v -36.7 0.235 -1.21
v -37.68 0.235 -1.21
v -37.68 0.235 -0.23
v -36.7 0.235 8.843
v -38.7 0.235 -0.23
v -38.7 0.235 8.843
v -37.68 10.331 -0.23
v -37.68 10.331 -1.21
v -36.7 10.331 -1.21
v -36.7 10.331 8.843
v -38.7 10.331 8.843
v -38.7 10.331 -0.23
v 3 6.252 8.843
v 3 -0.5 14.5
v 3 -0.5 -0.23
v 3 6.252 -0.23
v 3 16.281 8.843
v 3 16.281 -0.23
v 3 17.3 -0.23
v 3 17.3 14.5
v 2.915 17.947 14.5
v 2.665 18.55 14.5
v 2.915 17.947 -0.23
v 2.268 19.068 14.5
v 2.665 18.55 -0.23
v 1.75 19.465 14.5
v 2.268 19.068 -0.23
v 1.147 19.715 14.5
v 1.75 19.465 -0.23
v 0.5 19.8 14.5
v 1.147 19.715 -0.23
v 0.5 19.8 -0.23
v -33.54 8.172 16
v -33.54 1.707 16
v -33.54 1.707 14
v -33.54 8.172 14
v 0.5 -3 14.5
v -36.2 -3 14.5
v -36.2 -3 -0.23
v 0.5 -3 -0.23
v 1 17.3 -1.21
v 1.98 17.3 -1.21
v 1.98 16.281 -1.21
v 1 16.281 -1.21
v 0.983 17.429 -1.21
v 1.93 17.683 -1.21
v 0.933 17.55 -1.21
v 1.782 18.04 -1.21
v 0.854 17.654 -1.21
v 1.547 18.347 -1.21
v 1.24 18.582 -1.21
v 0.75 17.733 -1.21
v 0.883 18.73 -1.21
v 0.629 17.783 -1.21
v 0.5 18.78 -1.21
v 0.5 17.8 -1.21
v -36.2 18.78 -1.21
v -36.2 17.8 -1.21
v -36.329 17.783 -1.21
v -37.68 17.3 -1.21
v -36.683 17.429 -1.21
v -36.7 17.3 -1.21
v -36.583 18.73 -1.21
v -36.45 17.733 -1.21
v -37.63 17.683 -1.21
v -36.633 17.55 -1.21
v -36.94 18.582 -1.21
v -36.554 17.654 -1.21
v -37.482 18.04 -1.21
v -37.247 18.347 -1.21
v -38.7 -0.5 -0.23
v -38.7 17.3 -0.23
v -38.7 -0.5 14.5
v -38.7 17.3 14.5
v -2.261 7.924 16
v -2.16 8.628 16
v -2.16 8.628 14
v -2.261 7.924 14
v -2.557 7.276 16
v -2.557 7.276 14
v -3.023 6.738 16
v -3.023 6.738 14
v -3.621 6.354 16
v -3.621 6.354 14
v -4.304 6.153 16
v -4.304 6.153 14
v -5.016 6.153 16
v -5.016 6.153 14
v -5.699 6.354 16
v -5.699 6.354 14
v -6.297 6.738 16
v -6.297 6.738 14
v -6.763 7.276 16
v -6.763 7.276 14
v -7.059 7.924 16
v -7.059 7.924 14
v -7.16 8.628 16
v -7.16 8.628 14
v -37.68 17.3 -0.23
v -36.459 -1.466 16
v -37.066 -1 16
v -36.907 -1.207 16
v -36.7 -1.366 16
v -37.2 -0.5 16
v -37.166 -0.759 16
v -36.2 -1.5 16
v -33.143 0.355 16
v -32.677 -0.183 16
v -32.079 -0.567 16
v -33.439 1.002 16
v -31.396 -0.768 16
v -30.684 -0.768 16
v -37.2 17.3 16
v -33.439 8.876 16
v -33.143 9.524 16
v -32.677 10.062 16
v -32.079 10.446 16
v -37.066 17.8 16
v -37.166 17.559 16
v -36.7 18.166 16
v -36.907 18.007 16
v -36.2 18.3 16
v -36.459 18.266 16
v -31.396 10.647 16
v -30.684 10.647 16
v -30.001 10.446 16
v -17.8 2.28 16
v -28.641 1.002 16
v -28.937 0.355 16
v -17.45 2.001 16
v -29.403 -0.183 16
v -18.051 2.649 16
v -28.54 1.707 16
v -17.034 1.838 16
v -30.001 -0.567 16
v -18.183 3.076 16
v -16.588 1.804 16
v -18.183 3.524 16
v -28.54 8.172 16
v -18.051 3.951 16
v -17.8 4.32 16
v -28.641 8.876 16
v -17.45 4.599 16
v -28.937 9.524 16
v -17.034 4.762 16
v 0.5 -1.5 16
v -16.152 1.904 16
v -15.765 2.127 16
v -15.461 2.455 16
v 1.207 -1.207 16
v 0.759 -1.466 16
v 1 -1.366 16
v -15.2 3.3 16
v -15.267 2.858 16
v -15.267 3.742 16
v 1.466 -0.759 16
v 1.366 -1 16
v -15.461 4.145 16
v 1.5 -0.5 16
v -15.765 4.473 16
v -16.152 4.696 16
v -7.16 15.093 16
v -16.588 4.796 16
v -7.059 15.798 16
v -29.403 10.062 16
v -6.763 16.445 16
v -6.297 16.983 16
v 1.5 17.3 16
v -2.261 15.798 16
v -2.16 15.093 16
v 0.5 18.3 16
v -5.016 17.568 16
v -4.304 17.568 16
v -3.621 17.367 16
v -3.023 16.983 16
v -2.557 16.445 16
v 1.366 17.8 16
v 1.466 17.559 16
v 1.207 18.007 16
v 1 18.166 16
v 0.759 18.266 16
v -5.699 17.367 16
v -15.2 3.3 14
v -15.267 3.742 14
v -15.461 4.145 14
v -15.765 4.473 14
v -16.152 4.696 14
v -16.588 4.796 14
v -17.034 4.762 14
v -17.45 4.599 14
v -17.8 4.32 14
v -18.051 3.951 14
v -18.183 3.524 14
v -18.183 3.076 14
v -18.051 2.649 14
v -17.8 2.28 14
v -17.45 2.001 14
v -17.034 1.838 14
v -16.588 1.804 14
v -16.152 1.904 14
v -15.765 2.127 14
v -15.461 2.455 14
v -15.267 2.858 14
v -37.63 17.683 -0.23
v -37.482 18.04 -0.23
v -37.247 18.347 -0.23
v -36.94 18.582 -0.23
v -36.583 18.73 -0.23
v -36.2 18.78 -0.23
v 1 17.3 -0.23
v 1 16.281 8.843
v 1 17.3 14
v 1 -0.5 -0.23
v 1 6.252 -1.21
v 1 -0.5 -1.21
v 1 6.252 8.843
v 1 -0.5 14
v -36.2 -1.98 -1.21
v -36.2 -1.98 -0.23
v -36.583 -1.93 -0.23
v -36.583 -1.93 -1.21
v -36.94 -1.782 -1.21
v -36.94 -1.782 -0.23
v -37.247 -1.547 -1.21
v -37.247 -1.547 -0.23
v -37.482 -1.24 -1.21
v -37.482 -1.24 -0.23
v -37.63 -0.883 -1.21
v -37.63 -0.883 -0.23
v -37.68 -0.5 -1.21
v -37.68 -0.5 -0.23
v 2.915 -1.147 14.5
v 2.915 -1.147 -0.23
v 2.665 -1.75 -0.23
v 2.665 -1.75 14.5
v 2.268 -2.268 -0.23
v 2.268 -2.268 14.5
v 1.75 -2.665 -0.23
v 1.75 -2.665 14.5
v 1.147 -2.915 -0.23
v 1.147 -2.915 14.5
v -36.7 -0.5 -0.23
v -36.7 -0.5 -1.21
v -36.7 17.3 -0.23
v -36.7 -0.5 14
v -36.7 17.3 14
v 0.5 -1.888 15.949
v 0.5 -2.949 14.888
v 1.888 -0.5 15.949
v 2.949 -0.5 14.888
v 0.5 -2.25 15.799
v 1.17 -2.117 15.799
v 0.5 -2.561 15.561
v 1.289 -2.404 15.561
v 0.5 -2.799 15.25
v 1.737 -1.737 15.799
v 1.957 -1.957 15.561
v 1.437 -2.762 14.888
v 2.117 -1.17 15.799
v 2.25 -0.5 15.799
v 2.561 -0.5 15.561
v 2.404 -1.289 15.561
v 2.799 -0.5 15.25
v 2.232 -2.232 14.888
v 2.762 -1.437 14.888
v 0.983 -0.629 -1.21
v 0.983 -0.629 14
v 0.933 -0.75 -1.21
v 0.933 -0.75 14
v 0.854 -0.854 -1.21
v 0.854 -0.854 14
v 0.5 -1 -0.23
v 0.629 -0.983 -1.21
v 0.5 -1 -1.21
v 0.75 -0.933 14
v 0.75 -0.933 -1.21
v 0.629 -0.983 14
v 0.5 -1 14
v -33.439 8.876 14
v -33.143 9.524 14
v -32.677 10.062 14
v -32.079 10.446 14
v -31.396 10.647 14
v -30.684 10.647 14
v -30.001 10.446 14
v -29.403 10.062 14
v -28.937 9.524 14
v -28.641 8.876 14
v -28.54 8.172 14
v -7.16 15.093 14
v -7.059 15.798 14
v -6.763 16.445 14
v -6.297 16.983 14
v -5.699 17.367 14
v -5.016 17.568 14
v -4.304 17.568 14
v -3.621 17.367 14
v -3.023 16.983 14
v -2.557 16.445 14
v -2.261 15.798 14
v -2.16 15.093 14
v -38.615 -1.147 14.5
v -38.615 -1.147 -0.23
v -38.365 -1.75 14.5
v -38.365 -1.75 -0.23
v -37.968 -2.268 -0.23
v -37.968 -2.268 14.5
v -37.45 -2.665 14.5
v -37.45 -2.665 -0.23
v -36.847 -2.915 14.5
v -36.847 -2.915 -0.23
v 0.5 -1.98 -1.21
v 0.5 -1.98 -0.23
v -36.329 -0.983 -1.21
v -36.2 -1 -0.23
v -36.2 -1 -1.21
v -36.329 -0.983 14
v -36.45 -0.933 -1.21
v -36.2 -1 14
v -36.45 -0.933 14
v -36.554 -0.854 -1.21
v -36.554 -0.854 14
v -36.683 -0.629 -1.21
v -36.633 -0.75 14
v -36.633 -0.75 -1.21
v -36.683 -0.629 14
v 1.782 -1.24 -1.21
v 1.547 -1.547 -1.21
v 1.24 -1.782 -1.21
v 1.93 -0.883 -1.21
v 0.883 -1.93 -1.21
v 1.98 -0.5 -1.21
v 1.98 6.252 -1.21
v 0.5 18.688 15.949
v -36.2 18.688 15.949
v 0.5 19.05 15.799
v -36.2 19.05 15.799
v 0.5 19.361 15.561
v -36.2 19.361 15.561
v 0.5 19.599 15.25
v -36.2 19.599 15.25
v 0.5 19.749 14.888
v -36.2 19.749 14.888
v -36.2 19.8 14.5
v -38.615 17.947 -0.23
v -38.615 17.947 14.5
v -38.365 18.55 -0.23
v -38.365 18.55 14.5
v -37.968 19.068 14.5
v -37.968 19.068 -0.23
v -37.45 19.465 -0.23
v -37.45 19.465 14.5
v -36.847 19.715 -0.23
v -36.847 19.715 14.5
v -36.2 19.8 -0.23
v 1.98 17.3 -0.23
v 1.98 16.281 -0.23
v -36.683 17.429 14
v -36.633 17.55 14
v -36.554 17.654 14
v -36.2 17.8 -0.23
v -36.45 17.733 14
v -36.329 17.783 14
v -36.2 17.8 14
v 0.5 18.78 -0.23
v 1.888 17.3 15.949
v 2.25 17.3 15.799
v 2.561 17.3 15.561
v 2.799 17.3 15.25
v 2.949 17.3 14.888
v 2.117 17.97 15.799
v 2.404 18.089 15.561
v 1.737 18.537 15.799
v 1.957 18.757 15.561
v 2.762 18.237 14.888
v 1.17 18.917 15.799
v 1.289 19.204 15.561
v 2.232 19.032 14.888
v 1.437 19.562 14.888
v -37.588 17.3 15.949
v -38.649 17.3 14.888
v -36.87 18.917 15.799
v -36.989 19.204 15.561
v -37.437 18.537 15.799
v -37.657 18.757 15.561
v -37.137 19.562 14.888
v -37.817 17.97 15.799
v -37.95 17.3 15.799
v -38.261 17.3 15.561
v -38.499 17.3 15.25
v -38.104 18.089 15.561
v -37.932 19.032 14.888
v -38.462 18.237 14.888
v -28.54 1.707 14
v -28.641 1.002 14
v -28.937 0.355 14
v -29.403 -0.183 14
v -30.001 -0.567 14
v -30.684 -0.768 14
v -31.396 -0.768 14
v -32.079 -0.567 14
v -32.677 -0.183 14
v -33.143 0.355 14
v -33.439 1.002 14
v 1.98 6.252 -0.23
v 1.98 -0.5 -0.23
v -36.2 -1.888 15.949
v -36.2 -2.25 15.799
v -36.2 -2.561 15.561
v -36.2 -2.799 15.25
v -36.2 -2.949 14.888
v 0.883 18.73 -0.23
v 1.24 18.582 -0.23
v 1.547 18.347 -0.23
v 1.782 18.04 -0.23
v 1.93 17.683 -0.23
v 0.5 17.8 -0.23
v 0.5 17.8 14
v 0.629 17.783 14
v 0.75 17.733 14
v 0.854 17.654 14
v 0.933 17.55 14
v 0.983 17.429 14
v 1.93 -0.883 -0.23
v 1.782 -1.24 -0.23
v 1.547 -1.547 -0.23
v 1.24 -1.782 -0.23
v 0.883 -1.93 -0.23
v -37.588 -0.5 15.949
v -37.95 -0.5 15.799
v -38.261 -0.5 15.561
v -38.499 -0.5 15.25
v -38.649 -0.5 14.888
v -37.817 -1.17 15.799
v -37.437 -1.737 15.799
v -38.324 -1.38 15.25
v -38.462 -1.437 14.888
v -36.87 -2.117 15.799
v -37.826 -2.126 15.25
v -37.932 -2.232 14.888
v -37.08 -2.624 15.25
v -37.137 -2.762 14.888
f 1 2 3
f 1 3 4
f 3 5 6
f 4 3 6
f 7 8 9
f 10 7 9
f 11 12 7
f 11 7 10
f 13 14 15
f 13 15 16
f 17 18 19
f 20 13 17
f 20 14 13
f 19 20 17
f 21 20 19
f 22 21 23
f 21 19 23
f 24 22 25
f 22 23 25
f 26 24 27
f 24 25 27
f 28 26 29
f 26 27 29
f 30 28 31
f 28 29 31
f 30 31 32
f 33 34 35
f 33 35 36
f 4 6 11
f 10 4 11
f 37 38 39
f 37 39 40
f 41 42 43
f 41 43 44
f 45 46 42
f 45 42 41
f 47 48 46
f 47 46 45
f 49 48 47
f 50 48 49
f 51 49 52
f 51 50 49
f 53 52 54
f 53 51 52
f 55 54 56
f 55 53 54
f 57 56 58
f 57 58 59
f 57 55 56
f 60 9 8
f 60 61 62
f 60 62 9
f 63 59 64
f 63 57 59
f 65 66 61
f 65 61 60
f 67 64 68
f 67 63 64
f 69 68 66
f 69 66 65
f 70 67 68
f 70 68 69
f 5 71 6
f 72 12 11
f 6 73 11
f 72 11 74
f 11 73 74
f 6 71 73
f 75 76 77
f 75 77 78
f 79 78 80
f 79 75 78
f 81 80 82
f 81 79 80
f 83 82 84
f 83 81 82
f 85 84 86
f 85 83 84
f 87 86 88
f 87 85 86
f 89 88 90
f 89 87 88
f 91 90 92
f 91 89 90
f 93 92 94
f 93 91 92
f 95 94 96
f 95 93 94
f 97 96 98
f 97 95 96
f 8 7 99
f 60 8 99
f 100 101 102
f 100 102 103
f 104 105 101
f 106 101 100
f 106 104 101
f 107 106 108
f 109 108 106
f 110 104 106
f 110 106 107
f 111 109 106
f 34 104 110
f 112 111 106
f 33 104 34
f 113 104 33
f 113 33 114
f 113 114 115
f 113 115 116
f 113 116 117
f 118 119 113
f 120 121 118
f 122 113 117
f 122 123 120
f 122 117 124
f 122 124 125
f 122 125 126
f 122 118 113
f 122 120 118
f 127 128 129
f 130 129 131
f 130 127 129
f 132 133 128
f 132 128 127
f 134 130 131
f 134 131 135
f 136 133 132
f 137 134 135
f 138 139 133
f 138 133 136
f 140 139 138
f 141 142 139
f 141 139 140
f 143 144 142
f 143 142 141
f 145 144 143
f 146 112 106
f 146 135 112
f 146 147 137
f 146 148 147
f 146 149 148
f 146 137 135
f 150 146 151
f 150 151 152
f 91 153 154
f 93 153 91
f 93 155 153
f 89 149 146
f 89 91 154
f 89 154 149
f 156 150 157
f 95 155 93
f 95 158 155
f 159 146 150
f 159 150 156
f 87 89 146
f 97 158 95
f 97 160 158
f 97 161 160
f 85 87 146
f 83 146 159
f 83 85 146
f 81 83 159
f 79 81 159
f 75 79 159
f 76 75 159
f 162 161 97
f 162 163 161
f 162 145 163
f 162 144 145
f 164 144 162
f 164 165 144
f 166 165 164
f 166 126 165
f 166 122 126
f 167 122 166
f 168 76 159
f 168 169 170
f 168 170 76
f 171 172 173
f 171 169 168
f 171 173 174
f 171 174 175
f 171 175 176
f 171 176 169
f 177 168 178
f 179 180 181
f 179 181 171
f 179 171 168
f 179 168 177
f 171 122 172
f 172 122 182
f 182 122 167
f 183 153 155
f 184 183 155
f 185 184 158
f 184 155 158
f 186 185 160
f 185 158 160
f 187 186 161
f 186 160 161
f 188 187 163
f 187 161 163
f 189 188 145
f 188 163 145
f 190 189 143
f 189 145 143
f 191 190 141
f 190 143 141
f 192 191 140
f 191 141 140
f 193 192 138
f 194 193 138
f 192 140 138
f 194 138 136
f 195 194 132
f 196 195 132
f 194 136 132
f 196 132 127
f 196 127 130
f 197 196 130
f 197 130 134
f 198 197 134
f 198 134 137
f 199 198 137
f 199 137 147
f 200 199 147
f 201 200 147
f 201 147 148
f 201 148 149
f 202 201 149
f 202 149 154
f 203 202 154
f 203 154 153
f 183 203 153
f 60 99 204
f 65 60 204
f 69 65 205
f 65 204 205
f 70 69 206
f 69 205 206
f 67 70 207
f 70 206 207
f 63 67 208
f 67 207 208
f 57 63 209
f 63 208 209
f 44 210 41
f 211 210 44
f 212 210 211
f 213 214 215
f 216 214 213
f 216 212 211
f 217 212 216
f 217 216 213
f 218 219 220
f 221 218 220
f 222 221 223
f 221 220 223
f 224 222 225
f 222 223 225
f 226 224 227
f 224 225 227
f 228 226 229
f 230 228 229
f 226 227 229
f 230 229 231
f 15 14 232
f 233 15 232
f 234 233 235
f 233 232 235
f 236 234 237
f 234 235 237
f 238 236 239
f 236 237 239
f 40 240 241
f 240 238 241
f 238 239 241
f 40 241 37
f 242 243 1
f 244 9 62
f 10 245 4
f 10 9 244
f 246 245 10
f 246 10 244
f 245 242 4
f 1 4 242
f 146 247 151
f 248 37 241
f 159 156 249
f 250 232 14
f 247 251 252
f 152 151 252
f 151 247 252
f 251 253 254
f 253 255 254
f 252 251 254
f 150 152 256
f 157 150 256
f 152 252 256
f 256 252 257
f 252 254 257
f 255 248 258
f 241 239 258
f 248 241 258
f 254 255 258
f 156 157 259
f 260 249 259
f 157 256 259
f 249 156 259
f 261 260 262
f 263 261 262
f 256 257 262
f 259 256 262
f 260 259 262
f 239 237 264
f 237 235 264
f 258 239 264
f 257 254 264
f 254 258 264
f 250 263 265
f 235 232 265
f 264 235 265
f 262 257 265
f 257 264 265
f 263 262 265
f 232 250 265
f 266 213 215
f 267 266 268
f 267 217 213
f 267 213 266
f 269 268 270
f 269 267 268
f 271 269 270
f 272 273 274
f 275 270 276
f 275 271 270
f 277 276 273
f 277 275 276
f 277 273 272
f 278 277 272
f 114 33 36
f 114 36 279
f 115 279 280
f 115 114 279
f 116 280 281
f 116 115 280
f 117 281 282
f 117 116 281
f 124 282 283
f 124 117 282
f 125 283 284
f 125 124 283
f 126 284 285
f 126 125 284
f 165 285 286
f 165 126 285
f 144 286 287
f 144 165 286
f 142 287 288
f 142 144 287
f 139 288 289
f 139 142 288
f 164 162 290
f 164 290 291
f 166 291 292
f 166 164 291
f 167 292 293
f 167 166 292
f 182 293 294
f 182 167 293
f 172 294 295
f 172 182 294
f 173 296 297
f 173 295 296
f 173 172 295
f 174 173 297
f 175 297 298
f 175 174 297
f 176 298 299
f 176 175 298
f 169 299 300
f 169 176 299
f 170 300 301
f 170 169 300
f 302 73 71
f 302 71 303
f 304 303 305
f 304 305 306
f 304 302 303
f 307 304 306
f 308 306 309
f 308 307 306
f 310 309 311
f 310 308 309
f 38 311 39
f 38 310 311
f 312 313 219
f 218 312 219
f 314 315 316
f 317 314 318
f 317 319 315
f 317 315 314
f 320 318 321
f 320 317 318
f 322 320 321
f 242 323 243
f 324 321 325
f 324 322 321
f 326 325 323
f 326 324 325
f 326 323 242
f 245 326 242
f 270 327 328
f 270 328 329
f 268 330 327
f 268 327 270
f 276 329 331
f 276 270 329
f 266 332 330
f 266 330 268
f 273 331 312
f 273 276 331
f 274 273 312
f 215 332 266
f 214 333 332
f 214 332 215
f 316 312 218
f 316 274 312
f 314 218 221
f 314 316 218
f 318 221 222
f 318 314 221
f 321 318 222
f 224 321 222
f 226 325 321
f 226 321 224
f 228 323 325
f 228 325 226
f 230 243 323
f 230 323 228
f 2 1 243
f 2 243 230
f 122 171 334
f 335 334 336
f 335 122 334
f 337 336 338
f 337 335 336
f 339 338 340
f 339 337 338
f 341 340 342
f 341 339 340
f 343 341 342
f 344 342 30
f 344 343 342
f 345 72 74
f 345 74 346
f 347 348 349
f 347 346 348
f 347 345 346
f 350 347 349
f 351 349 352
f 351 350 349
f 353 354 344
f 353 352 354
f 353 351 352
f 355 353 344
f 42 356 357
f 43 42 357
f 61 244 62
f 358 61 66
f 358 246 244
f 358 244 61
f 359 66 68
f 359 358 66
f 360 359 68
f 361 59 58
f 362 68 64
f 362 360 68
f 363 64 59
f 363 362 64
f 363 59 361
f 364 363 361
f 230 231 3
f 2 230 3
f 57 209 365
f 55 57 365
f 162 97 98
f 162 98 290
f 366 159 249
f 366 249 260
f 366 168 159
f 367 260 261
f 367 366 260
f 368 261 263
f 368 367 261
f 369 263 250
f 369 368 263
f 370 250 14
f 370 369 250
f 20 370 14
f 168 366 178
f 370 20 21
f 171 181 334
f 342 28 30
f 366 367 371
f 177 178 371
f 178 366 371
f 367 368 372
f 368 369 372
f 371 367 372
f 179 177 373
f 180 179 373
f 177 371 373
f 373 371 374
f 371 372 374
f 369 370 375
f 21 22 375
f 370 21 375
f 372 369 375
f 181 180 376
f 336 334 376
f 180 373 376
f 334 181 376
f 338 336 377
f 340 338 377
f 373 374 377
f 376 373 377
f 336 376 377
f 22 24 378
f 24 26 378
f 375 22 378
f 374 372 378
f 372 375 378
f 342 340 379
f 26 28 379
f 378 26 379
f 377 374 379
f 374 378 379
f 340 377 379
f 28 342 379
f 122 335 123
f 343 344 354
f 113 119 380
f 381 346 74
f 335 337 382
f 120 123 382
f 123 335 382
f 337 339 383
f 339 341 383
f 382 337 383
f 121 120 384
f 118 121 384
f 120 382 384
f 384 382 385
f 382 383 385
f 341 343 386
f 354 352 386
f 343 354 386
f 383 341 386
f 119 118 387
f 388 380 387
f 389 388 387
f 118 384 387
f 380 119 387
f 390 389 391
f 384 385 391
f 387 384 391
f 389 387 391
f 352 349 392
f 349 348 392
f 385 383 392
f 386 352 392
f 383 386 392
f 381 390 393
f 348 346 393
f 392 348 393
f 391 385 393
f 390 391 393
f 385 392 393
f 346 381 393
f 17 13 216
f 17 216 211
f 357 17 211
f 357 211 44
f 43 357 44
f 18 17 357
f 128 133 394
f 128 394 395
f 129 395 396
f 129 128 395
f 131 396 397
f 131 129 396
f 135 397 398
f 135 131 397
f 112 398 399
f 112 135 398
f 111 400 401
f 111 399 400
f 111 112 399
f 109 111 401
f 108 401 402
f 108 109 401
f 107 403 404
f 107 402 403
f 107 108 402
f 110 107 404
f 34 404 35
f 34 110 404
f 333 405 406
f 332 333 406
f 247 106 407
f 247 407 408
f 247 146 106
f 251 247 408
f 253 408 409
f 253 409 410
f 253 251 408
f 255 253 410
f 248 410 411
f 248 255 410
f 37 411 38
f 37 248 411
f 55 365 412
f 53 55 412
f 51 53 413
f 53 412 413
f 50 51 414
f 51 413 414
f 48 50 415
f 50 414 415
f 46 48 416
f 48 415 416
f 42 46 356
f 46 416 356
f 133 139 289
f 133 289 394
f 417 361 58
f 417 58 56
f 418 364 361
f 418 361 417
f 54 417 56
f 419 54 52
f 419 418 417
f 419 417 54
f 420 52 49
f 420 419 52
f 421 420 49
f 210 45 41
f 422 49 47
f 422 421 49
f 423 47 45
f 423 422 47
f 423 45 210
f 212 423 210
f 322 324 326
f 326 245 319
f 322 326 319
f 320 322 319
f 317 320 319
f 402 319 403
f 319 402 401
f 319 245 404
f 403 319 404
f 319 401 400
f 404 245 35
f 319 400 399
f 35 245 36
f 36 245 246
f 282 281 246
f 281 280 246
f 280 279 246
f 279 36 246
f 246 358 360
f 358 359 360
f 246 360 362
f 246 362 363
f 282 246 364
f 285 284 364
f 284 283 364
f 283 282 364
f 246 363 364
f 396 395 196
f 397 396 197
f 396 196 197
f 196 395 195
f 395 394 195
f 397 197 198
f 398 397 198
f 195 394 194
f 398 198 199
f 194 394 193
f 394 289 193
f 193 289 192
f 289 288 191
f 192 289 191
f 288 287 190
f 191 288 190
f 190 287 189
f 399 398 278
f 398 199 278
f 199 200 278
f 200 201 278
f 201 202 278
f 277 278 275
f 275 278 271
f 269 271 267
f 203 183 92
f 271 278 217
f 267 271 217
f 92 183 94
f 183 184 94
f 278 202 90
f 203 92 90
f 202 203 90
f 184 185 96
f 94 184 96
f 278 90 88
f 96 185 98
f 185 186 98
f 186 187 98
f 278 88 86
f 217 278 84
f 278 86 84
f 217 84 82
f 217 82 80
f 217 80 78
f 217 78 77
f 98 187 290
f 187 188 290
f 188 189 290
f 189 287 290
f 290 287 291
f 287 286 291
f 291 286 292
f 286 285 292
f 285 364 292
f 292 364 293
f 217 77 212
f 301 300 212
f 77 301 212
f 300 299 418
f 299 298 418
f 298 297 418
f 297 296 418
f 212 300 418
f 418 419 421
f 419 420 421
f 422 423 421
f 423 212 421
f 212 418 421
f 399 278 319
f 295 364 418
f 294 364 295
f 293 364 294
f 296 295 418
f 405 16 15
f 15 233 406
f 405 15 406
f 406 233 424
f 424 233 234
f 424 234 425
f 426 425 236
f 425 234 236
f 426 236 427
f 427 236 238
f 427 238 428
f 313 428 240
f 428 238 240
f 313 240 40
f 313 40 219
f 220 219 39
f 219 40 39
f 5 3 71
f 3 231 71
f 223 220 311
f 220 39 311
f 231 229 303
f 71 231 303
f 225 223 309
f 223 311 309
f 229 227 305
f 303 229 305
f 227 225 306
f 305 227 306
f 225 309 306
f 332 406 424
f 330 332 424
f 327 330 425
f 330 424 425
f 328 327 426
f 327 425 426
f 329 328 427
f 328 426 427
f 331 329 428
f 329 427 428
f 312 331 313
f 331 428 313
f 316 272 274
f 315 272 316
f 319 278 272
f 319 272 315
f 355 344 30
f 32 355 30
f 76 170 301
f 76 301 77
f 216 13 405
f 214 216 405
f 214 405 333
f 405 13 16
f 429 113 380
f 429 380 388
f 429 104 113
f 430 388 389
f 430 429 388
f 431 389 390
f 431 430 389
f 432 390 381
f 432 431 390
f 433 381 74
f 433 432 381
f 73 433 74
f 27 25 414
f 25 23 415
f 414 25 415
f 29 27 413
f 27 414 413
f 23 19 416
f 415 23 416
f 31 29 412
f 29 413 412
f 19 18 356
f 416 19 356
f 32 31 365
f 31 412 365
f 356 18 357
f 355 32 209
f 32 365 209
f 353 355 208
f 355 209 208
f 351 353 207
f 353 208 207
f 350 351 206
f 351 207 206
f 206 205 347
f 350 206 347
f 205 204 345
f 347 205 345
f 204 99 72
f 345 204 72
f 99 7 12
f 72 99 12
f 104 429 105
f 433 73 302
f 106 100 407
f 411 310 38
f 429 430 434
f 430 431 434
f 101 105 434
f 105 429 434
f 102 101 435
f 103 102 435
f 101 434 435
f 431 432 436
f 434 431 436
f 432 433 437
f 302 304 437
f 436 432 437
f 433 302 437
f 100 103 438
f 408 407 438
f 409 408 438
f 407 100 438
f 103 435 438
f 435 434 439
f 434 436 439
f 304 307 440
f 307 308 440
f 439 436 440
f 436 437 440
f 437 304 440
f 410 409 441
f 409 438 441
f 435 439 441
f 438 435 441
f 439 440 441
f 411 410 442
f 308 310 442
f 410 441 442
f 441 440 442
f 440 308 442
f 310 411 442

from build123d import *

# Parameters (mm, degrees)
SKETCH1_W                = 41.700000763
SKETCH1_H                = 22.799999237
BOSS_EXTRUDE1_DEPTH      = 16
BOSS_EXTRUDE1_DEPTH_BACK = 6
FILLET1_R                = 2.5
SHELL1_T                 = 2
FILLET2_R                = 1.5
SPLIT2_SURFACE_1_BACK    = 53.371
SPLIT2_SURFACE_1_DEPTH   = 106.742
SPLIT2_SURFACE_2_BACK    = 53.371
SPLIT2_SURFACE_2_DEPTH   = 106.742
SKETCH6_W                = 51.834983027
SKETCH6_H                = 10.188595942
CUT_EXTRUDE1_DEPTH       = 25
BOSS_EXTRUDE2_DEPTH      = 0.98
CUT_EXTRUDE2_DEPTH       = 11
SKETCH9_W                = 11.335588894
SKETCH9_H                = 10.028184506
CUT_EXTRUDE3_DEPTH       = 11
SKETCH10_W               = 11.009113092
SKETCH10_H               = 10.096148938
CUT_EXTRUDE4_DEPTH       = 11
SKETCH11_R               = 1.5
CUT_EXTRUDE5_DEPTH       = 11


with BuildPart() as part:
    # Sketch1 → Boss-Extrude1 (new, two sides)
    with BuildSketch(Plane.XY) as boss_extrude1_sk:
        with Locations((-17.850000382, 8.399999619)):
            Rectangle(SKETCH1_W, SKETCH1_H)
    extrude(amount=BOSS_EXTRUDE1_DEPTH)
    extrude(boss_extrude1_sk.sketch, amount=-BOSS_EXTRUDE1_DEPTH_BACK)

    # Fillet1
    fillet1_edges = [part.edges().sort_by_distance(p)[0] for p in [
        (3, -3, 5),
        (3, 19.799999237, 5),
        (-38.700000763, 19.799999237, 5),
        (-38.700000763, -3, 5),
    ]]
    fillet(fillet1_edges, radius=FILLET1_R)

    # Shell1 (no face opened: a closed hollow body)
    add(offset(amount=-SHELL1_T, mode=Mode.PRIVATE), mode=Mode.SUBTRACT)

    # Fillet2
    fillet2_edges = [part.edges().sort_by_distance(p)[0] for p in [
        (-17.850000381, -3, 16),
        (3, 8.399999619, 16),
        (-17.850000381, 19.799999237, 16),
        (-38.700000763, 8.399999619, 16),
        (-37.967767716, -2.267766953, 16),
        (-37.967767716, 19.06776619, 16),
        (2.267766953, 19.06776619, 16),
        (2.267766953, -2.267766953, 16),
    ]]
    fillet(fillet2_edges, radius=FILLET2_R)


with BuildPart() as body_2:
    # Split2: the piece behind the surface
    add(part.part)
    # Split2 surface: a surface, the sketch's curves swept straight by 106.742 mm
    with BuildLine(Plane(origin=(0, 0, 0), x_dir=(1, 0, 0), z_dir=(0, 1, 0)).offset(-SPLIT2_SURFACE_1_BACK), mode=Mode.PRIVATE) as split2_surface_1_path:
        Line((11.527694016, 0.23), (-46.74820982, 0.23))
    split2_surface_1 = Shell.extrude(split2_surface_1_path.wire(), (0 * SPLIT2_SURFACE_1_DEPTH, 1 * SPLIT2_SURFACE_1_DEPTH, 0 * SPLIT2_SURFACE_1_DEPTH))
    split(bisect_by=split2_surface_1, keep=Keep.BOTTOM)

    # Sketch6 → Cut-Extrude1 (cut)
    with BuildSketch(Plane.XZ.offset(3)):
        with Locations((-19.404183034, -5.324297971)):
            Rectangle(SKETCH6_W, SKETCH6_H)
    extrude(amount=-CUT_EXTRUDE1_DEPTH, mode=Mode.SUBTRACT)


with BuildPart() as part_1:
    add(part.part)

    # Split2: split by a surface, the side it looks to stays
    # Split2 surface: a surface, the sketch's curves swept straight by 106.742 mm
    with BuildLine(Plane(origin=(0, 0, 0), x_dir=(1, 0, 0), z_dir=(0, 1, 0)).offset(-SPLIT2_SURFACE_2_BACK), mode=Mode.PRIVATE) as split2_surface_2_path:
        Line((11.527694016, 0.23), (-46.74820982, 0.23))
    split2_surface_2 = Shell.extrude(split2_surface_2_path.wire(), (0 * SPLIT2_SURFACE_2_DEPTH, 1 * SPLIT2_SURFACE_2_DEPTH, 0 * SPLIT2_SURFACE_2_DEPTH))
    split(bisect_by=split2_surface_2, keep=Keep.TOP)

    # Sketch7 → Boss-Extrude2 (add)
    with BuildSketch(Plane(origin=(0, 0, -0.23), x_dir=(-1, 0, 0), z_dir=(0, 0, -1))):
        with BuildLine():
            Line((-0.5, -1.98), (36.200000763, -1.98))
            ThreePointArc((36.200000763, -1.98), (37.246518799, -1.546518036), (37.680000763, -0.5))
            Line((37.680000763, -0.5), (37.680000763, 17.299999237))
            ThreePointArc((37.680000763, 17.299999237), (37.246518799, 18.346517273), (36.200000763, 18.779999237))
            Line((36.200000763, 18.779999237), (-0.5, 18.779999237))
            ThreePointArc((-0.5, 18.779999237), (-1.546518036, 18.346517273), (-1.98, 17.299999237))
            Line((-1.98, 17.299999237), (-1.98, -0.5))
            ThreePointArc((-1.98, -0.5), (-1.546518036, -1.546518036), (-0.5, -1.98))
        make_face()
        with BuildLine():
            Line((-0.5, -1), (36.200000763, -1))
            ThreePointArc((36.200000763, -1), (36.553554154, -0.853553391), (36.700000763, -0.5))
            Line((36.700000763, -0.5), (36.700000763, 17.299999237))
            ThreePointArc((36.700000763, 17.299999237), (36.553554154, 17.653552628), (36.200000763, 17.799999237))
            Line((36.200000763, 17.799999237), (-0.5, 17.799999237))
            ThreePointArc((-0.5, 17.799999237), (-0.853553391, 17.653552628), (-1, 17.299999237))
            Line((-1, 17.299999237), (-1, -0.5))
            ThreePointArc((-1, -0.5), (-0.853553391, -0.853553391), (-0.5, -1))
        make_face(mode=Mode.SUBTRACT)
    extrude(amount=BOSS_EXTRUDE2_DEPTH)

    # Sketch8 → Cut-Extrude2 (cut)
    with BuildSketch(Plane.XY.offset(16)):
        with BuildLine():
            Line((-2.16, 15.093417893), (-2.16, 8.627866409))
            ThreePointArc((-2.16, 8.627866409), (-4.66, 6.127866409), (-7.16, 8.627866409))
            Line((-7.16, 8.627866409), (-7.16, 15.093417893))
            ThreePointArc((-7.16, 15.093417893), (-4.66, 17.593417893), (-2.16, 15.093417893))
        make_face()
        with BuildLine():
            Line((-33.540000763, 1.706581344), (-33.540000763, 8.172132828))
            ThreePointArc((-33.540000763, 8.172132828), (-31.040000763, 10.672132828), (-28.540000763, 8.172132828))
            Line((-28.540000763, 8.172132828), (-28.540000763, 1.706581344))
            ThreePointArc((-28.540000763, 1.706581344), (-31.040000763, -0.793418656), (-33.540000763, 1.706581344))
        make_face()
    extrude(amount=-CUT_EXTRUDE2_DEPTH, mode=Mode.SUBTRACT)

    # Sketch9 → Cut-Extrude3 (cut)
    with BuildSketch(Plane(origin=(3, 0, 0), x_dir=(0, 0, -1), z_dir=(1, 0, 0))):
        with Locations((-3.175571545, 11.266589504)):
            Rectangle(SKETCH9_W, SKETCH9_H)
    extrude(amount=-CUT_EXTRUDE3_DEPTH, mode=Mode.SUBTRACT)

    # Sketch10 → Cut-Extrude4 (cut)
    with BuildSketch(Plane.ZY.offset(38.700000763)):
        with Locations((3.338809446, 5.283196064)):
            Rectangle(SKETCH10_W, SKETCH10_H)
    extrude(amount=-CUT_EXTRUDE4_DEPTH, mode=Mode.SUBTRACT)

    # Sketch11 → Cut-Extrude5 (cut)
    with BuildSketch(Plane.XY.offset(16)):
        with Locations((-16.7, 3.3)):
            Circle(SKETCH11_R)
    extrude(amount=-CUT_EXTRUDE5_DEPTH, mode=Mode.SUBTRACT)


solid = part_1.part
